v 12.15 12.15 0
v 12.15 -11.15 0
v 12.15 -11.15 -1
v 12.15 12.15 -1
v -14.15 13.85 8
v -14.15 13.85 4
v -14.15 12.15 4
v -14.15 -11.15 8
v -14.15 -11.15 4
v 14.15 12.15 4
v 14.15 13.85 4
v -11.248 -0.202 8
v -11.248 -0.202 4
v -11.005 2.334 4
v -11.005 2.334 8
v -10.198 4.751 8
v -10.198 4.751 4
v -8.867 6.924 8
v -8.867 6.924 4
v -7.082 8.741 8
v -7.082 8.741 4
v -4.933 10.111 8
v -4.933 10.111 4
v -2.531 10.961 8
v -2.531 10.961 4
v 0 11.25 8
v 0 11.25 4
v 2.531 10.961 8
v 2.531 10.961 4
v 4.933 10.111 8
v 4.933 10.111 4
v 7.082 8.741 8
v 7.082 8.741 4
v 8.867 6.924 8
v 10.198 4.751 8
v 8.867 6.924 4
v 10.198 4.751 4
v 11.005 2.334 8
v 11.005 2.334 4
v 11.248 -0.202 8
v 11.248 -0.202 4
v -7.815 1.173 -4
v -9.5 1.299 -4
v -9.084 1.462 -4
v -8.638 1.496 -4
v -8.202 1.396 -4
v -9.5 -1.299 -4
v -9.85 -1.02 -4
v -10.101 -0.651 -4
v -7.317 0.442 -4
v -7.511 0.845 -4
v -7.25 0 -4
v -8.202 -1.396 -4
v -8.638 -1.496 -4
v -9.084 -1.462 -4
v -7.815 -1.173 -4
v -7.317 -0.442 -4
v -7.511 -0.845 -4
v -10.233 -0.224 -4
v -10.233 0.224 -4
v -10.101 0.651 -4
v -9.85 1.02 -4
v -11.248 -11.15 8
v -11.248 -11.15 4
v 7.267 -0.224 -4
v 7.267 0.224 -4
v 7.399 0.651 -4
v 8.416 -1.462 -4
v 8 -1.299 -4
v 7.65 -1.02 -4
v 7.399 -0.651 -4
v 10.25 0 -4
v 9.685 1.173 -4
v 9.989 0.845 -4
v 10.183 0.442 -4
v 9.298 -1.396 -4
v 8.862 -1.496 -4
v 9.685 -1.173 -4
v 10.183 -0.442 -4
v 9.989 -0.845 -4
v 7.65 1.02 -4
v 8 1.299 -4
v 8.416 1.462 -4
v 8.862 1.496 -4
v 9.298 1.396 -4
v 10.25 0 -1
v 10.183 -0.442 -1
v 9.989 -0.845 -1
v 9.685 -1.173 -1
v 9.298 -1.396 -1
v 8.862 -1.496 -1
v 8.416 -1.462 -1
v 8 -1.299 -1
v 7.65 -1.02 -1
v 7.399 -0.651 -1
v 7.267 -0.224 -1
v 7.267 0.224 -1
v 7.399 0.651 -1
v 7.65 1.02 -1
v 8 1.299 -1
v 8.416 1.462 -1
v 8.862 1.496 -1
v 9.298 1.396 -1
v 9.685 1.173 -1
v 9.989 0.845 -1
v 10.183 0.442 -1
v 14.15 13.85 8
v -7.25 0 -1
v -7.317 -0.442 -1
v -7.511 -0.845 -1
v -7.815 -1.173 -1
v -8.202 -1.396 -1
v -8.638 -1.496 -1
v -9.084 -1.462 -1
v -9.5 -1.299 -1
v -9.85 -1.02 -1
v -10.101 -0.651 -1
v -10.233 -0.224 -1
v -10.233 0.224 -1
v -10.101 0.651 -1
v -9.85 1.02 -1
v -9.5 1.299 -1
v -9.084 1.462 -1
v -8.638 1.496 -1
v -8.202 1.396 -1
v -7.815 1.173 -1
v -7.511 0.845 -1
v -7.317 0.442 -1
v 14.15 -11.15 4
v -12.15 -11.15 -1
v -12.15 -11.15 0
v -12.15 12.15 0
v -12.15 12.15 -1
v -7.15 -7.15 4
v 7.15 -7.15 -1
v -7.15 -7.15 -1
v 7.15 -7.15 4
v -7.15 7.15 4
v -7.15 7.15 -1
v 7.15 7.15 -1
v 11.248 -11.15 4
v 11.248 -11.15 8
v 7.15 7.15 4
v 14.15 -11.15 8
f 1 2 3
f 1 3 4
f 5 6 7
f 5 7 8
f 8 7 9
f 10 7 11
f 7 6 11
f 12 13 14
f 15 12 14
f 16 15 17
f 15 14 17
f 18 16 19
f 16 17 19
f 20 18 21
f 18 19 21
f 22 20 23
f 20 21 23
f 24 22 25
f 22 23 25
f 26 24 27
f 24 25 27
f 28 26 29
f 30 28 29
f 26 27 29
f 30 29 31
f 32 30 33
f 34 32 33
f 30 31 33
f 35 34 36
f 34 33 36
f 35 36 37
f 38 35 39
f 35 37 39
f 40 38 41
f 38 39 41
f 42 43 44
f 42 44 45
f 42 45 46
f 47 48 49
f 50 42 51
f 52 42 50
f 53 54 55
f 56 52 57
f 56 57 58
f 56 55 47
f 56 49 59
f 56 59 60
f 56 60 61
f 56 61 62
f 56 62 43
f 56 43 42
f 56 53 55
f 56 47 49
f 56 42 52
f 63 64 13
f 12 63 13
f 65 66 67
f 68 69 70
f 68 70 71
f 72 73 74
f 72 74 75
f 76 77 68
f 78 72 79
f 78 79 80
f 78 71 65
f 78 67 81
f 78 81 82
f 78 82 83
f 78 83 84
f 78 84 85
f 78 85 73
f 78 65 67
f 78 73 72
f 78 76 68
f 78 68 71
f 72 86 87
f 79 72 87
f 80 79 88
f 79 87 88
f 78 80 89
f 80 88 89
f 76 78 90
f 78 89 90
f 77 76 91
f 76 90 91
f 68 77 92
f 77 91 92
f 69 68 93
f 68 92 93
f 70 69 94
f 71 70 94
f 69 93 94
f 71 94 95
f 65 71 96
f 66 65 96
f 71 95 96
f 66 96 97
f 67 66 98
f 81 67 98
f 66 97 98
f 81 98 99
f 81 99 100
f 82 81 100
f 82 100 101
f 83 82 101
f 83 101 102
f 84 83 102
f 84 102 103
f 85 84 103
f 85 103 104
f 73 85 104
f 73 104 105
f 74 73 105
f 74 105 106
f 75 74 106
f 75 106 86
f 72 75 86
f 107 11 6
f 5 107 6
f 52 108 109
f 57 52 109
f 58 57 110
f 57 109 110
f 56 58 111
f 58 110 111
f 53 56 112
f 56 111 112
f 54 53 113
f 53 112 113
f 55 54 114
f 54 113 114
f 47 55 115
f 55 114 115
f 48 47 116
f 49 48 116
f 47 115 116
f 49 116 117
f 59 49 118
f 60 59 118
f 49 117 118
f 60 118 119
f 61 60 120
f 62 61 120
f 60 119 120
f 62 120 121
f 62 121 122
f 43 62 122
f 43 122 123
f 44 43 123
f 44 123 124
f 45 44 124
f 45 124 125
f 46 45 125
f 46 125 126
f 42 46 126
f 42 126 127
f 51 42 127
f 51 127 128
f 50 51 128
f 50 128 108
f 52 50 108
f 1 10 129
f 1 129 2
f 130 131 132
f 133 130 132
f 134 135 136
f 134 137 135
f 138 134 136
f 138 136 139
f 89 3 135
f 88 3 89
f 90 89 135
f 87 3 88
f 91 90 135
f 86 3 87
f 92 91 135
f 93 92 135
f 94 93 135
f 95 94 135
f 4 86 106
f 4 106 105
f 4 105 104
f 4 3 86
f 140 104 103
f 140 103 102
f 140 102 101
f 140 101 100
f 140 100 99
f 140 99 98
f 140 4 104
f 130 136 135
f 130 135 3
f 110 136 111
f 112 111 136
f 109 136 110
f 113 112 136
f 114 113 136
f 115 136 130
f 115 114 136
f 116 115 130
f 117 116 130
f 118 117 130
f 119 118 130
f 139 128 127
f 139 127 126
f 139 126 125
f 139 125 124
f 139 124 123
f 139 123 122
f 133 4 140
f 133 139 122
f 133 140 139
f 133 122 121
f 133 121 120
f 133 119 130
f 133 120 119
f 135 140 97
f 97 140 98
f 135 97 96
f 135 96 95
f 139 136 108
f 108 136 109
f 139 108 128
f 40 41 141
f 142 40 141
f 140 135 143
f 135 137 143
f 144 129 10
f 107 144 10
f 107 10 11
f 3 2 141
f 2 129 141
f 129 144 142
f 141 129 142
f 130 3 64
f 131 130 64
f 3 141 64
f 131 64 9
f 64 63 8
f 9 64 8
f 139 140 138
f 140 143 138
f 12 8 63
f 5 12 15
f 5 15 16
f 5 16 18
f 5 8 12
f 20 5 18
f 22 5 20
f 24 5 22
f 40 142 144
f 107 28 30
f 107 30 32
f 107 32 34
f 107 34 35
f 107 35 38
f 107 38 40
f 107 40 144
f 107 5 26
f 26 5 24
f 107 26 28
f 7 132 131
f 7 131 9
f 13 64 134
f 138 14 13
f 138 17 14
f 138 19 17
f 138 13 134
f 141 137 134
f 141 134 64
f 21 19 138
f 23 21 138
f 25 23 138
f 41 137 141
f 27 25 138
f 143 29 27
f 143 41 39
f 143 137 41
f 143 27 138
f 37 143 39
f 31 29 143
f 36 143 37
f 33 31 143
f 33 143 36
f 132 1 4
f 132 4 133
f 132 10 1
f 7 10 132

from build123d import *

# Parameters (mm, degrees)
SKETCH1_W                       = 24.3
SKETCH1_H                       = 24.3
SKETCH1_W_2                     = 14.3
SKETCH1_H_2                     = 14.3
BOSS_EXTRUDE1_DEPTH             = 4
SKETCH3_R                       = 1.5
BOSS_EXTRUDE4_DEPTH             = 4
BOSS_EXTRUDE5_DEPTH             = 4
BOSS_EXTRUDE6_REACH             = 23.355
BOSS_EXTRUDE6_DIRECTION_2_REACH = 23.355
CUT_EXTRUDE1_DEPTH              = 11
SKETCH7_W                       = 24.3
SKETCH7_H                       = 23.3
SKETCH7_W_2                     = 14.3
SKETCH7_H_2                     = 14.3
BOSS_EXTRUDE8_DEPTH             = 1


with BuildPart() as part:
    # Sketch1 → Boss-Extrude1 (new body)
    with BuildSketch(Plane.XY):
        Rectangle(SKETCH1_W, SKETCH1_H)
        Rectangle(SKETCH1_W_2, SKETCH1_H_2, mode=Mode.SUBTRACT)
    extrude(amount=BOSS_EXTRUDE1_DEPTH)

    # Sketch3 → Boss-Extrude4 (add)
    with BuildSketch(Plane(origin=(0, 0, 0), x_dir=(-1, 0, 0), z_dir=(0, 0, -1))):
        with Locations(Location((8.75, 0, 0), (0, 0, 180))):
            Circle(SKETCH3_R)
        with Locations(Location((-8.75, 0, 0), (0, 0, 180))):
            Circle(SKETCH3_R)
    extrude(amount=BOSS_EXTRUDE4_DEPTH)

    # Sketch4 → Boss-Extrude5 (add)
    with BuildSketch(Plane.XY.offset(4)):
        with BuildLine():
            Line((11.248190336, -0.201777492), (11.248190336, -11.15))
            Line((11.248190336, -11.15), (14.15, -11.15))
            Line((14.15, -11.15), (14.15, 13.85))
            Line((14.15, 13.85), (-14.15, 13.85))
            Line((-14.15, 13.85), (-14.15, -11.15))
            Line((-14.15, -11.15), (-11.248190336, -11.15))
            Line((-11.248190336, -11.15), (-11.248190336, -0.201777492))
            ThreePointArc((-11.248190336, -0.201777492), (0, 11.25), (11.248190336, -0.201777492))
        make_face()
    extrude(amount=BOSS_EXTRUDE5_DEPTH)

    # Boss-Extrude6: up to this face of the body (flat: up to its plane)
    boss_extrude6_end = Plane(part.part.faces().sort_by_distance((0, 12.15, 2))[0])
    # Sketch5 → Boss-Extrude6 (add, up to the picked face)
    with BuildSketch(Plane(origin=(0, 0, 0), x_dir=(1, 0, 0), z_dir=(0, 1, 0)), mode=Mode.PRIVATE) as boss_extrude6_sk1:
        Polygon((-12.15, 0), (-14.15, -4), (-12.15, -4), align=None)
    boss_extrude6_tool1 = split(extrude(boss_extrude6_sk1.sketch, amount=BOSS_EXTRUDE6_REACH, mode=Mode.PRIVATE), bisect_by=boss_extrude6_end, keep=Keep.BOTH, mode=Mode.PRIVATE)
    # Sketch5 → Boss-Extrude6 (add, up to the picked face)
    with BuildSketch(Plane(origin=(0, 0, 0), x_dir=(1, 0, 0), z_dir=(0, 1, 0)), mode=Mode.PRIVATE) as boss_extrude6_sk2:
        Polygon((12.15, 0), (12.15, -4), (14.15, -4), align=None)
    boss_extrude6_tool2 = split(extrude(boss_extrude6_sk2.sketch, amount=BOSS_EXTRUDE6_REACH, mode=Mode.PRIVATE), bisect_by=boss_extrude6_end, keep=Keep.BOTH, mode=Mode.PRIVATE)
    add(boss_extrude6_tool1.solids().sort_by(Axis((-12.816667, 0, 2.666667), (0, 1, 0)))[0])
    add(boss_extrude6_tool2.solids().sort_by(Axis((12.816667, 0, 2.666667), (0, 1, 0)))[0])

    # Boss-Extrude6 direction 2: up to this face of the body (flat: up to its plane)
    boss_extrude6_direction_2_end = Plane(part.part.faces().sort_by_distance((12.699095168, -11.15, 6))[0])
    # Sketch5 → Boss-Extrude6 direction 2 (add, up to the picked face)
    with BuildSketch(Plane(origin=(0, 0, 0), x_dir=(1, 0, 0), z_dir=(0, 1, 0)), mode=Mode.PRIVATE) as boss_extrude6_direction_2_sk1:
        Polygon((-12.15, 0), (-14.15, -4), (-12.15, -4), align=None)
    boss_extrude6_direction_2_tool1 = split(extrude(boss_extrude6_direction_2_sk1.sketch, amount=-BOSS_EXTRUDE6_DIRECTION_2_REACH, mode=Mode.PRIVATE), bisect_by=boss_extrude6_direction_2_end, keep=Keep.BOTH, mode=Mode.PRIVATE)
    # Sketch5 → Boss-Extrude6 direction 2 (add, up to the picked face)
    with BuildSketch(Plane(origin=(0, 0, 0), x_dir=(1, 0, 0), z_dir=(0, 1, 0)), mode=Mode.PRIVATE) as boss_extrude6_direction_2_sk2:
        Polygon((12.15, 0), (12.15, -4), (14.15, -4), align=None)
    boss_extrude6_direction_2_tool2 = split(extrude(boss_extrude6_direction_2_sk2.sketch, amount=-BOSS_EXTRUDE6_DIRECTION_2_REACH, mode=Mode.PRIVATE), bisect_by=boss_extrude6_direction_2_end, keep=Keep.BOTH, mode=Mode.PRIVATE)
    add(boss_extrude6_direction_2_tool1.solids().sort_by(Axis((-12.816667, 0, 2.666667), (0, -1, 0)))[0])
    add(boss_extrude6_direction_2_tool2.solids().sort_by(Axis((12.816667, 0, 2.666667), (0, -1, 0)))[0])

    # Sketch6 → Cut-Extrude1 (cut)
    with BuildSketch(Plane.XY.offset(4)):
        Polygon((-14.15, -11.15), (-17.465023318, -11.15), (-17.465023318, -14.474968539), (16.848397365, -14.474968539), (16.848397365, -10.738940706), (14.15, -11.15), align=None)
    extrude(amount=-CUT_EXTRUDE1_DEPTH, mode=Mode.SUBTRACT)

    # Sketch7 → Boss-Extrude8 (add)
    with BuildSketch(Plane(origin=(0, 0, 0), x_dir=(-1, 0, 0), z_dir=(0, 0, -1))):
        with Locations((0, 0.5)):
            Rectangle(SKETCH7_W, SKETCH7_H)
        Rectangle(SKETCH7_W_2, SKETCH7_H_2, mode=Mode.SUBTRACT)
    extrude(amount=BOSS_EXTRUDE8_DEPTH)


solid = part.part
